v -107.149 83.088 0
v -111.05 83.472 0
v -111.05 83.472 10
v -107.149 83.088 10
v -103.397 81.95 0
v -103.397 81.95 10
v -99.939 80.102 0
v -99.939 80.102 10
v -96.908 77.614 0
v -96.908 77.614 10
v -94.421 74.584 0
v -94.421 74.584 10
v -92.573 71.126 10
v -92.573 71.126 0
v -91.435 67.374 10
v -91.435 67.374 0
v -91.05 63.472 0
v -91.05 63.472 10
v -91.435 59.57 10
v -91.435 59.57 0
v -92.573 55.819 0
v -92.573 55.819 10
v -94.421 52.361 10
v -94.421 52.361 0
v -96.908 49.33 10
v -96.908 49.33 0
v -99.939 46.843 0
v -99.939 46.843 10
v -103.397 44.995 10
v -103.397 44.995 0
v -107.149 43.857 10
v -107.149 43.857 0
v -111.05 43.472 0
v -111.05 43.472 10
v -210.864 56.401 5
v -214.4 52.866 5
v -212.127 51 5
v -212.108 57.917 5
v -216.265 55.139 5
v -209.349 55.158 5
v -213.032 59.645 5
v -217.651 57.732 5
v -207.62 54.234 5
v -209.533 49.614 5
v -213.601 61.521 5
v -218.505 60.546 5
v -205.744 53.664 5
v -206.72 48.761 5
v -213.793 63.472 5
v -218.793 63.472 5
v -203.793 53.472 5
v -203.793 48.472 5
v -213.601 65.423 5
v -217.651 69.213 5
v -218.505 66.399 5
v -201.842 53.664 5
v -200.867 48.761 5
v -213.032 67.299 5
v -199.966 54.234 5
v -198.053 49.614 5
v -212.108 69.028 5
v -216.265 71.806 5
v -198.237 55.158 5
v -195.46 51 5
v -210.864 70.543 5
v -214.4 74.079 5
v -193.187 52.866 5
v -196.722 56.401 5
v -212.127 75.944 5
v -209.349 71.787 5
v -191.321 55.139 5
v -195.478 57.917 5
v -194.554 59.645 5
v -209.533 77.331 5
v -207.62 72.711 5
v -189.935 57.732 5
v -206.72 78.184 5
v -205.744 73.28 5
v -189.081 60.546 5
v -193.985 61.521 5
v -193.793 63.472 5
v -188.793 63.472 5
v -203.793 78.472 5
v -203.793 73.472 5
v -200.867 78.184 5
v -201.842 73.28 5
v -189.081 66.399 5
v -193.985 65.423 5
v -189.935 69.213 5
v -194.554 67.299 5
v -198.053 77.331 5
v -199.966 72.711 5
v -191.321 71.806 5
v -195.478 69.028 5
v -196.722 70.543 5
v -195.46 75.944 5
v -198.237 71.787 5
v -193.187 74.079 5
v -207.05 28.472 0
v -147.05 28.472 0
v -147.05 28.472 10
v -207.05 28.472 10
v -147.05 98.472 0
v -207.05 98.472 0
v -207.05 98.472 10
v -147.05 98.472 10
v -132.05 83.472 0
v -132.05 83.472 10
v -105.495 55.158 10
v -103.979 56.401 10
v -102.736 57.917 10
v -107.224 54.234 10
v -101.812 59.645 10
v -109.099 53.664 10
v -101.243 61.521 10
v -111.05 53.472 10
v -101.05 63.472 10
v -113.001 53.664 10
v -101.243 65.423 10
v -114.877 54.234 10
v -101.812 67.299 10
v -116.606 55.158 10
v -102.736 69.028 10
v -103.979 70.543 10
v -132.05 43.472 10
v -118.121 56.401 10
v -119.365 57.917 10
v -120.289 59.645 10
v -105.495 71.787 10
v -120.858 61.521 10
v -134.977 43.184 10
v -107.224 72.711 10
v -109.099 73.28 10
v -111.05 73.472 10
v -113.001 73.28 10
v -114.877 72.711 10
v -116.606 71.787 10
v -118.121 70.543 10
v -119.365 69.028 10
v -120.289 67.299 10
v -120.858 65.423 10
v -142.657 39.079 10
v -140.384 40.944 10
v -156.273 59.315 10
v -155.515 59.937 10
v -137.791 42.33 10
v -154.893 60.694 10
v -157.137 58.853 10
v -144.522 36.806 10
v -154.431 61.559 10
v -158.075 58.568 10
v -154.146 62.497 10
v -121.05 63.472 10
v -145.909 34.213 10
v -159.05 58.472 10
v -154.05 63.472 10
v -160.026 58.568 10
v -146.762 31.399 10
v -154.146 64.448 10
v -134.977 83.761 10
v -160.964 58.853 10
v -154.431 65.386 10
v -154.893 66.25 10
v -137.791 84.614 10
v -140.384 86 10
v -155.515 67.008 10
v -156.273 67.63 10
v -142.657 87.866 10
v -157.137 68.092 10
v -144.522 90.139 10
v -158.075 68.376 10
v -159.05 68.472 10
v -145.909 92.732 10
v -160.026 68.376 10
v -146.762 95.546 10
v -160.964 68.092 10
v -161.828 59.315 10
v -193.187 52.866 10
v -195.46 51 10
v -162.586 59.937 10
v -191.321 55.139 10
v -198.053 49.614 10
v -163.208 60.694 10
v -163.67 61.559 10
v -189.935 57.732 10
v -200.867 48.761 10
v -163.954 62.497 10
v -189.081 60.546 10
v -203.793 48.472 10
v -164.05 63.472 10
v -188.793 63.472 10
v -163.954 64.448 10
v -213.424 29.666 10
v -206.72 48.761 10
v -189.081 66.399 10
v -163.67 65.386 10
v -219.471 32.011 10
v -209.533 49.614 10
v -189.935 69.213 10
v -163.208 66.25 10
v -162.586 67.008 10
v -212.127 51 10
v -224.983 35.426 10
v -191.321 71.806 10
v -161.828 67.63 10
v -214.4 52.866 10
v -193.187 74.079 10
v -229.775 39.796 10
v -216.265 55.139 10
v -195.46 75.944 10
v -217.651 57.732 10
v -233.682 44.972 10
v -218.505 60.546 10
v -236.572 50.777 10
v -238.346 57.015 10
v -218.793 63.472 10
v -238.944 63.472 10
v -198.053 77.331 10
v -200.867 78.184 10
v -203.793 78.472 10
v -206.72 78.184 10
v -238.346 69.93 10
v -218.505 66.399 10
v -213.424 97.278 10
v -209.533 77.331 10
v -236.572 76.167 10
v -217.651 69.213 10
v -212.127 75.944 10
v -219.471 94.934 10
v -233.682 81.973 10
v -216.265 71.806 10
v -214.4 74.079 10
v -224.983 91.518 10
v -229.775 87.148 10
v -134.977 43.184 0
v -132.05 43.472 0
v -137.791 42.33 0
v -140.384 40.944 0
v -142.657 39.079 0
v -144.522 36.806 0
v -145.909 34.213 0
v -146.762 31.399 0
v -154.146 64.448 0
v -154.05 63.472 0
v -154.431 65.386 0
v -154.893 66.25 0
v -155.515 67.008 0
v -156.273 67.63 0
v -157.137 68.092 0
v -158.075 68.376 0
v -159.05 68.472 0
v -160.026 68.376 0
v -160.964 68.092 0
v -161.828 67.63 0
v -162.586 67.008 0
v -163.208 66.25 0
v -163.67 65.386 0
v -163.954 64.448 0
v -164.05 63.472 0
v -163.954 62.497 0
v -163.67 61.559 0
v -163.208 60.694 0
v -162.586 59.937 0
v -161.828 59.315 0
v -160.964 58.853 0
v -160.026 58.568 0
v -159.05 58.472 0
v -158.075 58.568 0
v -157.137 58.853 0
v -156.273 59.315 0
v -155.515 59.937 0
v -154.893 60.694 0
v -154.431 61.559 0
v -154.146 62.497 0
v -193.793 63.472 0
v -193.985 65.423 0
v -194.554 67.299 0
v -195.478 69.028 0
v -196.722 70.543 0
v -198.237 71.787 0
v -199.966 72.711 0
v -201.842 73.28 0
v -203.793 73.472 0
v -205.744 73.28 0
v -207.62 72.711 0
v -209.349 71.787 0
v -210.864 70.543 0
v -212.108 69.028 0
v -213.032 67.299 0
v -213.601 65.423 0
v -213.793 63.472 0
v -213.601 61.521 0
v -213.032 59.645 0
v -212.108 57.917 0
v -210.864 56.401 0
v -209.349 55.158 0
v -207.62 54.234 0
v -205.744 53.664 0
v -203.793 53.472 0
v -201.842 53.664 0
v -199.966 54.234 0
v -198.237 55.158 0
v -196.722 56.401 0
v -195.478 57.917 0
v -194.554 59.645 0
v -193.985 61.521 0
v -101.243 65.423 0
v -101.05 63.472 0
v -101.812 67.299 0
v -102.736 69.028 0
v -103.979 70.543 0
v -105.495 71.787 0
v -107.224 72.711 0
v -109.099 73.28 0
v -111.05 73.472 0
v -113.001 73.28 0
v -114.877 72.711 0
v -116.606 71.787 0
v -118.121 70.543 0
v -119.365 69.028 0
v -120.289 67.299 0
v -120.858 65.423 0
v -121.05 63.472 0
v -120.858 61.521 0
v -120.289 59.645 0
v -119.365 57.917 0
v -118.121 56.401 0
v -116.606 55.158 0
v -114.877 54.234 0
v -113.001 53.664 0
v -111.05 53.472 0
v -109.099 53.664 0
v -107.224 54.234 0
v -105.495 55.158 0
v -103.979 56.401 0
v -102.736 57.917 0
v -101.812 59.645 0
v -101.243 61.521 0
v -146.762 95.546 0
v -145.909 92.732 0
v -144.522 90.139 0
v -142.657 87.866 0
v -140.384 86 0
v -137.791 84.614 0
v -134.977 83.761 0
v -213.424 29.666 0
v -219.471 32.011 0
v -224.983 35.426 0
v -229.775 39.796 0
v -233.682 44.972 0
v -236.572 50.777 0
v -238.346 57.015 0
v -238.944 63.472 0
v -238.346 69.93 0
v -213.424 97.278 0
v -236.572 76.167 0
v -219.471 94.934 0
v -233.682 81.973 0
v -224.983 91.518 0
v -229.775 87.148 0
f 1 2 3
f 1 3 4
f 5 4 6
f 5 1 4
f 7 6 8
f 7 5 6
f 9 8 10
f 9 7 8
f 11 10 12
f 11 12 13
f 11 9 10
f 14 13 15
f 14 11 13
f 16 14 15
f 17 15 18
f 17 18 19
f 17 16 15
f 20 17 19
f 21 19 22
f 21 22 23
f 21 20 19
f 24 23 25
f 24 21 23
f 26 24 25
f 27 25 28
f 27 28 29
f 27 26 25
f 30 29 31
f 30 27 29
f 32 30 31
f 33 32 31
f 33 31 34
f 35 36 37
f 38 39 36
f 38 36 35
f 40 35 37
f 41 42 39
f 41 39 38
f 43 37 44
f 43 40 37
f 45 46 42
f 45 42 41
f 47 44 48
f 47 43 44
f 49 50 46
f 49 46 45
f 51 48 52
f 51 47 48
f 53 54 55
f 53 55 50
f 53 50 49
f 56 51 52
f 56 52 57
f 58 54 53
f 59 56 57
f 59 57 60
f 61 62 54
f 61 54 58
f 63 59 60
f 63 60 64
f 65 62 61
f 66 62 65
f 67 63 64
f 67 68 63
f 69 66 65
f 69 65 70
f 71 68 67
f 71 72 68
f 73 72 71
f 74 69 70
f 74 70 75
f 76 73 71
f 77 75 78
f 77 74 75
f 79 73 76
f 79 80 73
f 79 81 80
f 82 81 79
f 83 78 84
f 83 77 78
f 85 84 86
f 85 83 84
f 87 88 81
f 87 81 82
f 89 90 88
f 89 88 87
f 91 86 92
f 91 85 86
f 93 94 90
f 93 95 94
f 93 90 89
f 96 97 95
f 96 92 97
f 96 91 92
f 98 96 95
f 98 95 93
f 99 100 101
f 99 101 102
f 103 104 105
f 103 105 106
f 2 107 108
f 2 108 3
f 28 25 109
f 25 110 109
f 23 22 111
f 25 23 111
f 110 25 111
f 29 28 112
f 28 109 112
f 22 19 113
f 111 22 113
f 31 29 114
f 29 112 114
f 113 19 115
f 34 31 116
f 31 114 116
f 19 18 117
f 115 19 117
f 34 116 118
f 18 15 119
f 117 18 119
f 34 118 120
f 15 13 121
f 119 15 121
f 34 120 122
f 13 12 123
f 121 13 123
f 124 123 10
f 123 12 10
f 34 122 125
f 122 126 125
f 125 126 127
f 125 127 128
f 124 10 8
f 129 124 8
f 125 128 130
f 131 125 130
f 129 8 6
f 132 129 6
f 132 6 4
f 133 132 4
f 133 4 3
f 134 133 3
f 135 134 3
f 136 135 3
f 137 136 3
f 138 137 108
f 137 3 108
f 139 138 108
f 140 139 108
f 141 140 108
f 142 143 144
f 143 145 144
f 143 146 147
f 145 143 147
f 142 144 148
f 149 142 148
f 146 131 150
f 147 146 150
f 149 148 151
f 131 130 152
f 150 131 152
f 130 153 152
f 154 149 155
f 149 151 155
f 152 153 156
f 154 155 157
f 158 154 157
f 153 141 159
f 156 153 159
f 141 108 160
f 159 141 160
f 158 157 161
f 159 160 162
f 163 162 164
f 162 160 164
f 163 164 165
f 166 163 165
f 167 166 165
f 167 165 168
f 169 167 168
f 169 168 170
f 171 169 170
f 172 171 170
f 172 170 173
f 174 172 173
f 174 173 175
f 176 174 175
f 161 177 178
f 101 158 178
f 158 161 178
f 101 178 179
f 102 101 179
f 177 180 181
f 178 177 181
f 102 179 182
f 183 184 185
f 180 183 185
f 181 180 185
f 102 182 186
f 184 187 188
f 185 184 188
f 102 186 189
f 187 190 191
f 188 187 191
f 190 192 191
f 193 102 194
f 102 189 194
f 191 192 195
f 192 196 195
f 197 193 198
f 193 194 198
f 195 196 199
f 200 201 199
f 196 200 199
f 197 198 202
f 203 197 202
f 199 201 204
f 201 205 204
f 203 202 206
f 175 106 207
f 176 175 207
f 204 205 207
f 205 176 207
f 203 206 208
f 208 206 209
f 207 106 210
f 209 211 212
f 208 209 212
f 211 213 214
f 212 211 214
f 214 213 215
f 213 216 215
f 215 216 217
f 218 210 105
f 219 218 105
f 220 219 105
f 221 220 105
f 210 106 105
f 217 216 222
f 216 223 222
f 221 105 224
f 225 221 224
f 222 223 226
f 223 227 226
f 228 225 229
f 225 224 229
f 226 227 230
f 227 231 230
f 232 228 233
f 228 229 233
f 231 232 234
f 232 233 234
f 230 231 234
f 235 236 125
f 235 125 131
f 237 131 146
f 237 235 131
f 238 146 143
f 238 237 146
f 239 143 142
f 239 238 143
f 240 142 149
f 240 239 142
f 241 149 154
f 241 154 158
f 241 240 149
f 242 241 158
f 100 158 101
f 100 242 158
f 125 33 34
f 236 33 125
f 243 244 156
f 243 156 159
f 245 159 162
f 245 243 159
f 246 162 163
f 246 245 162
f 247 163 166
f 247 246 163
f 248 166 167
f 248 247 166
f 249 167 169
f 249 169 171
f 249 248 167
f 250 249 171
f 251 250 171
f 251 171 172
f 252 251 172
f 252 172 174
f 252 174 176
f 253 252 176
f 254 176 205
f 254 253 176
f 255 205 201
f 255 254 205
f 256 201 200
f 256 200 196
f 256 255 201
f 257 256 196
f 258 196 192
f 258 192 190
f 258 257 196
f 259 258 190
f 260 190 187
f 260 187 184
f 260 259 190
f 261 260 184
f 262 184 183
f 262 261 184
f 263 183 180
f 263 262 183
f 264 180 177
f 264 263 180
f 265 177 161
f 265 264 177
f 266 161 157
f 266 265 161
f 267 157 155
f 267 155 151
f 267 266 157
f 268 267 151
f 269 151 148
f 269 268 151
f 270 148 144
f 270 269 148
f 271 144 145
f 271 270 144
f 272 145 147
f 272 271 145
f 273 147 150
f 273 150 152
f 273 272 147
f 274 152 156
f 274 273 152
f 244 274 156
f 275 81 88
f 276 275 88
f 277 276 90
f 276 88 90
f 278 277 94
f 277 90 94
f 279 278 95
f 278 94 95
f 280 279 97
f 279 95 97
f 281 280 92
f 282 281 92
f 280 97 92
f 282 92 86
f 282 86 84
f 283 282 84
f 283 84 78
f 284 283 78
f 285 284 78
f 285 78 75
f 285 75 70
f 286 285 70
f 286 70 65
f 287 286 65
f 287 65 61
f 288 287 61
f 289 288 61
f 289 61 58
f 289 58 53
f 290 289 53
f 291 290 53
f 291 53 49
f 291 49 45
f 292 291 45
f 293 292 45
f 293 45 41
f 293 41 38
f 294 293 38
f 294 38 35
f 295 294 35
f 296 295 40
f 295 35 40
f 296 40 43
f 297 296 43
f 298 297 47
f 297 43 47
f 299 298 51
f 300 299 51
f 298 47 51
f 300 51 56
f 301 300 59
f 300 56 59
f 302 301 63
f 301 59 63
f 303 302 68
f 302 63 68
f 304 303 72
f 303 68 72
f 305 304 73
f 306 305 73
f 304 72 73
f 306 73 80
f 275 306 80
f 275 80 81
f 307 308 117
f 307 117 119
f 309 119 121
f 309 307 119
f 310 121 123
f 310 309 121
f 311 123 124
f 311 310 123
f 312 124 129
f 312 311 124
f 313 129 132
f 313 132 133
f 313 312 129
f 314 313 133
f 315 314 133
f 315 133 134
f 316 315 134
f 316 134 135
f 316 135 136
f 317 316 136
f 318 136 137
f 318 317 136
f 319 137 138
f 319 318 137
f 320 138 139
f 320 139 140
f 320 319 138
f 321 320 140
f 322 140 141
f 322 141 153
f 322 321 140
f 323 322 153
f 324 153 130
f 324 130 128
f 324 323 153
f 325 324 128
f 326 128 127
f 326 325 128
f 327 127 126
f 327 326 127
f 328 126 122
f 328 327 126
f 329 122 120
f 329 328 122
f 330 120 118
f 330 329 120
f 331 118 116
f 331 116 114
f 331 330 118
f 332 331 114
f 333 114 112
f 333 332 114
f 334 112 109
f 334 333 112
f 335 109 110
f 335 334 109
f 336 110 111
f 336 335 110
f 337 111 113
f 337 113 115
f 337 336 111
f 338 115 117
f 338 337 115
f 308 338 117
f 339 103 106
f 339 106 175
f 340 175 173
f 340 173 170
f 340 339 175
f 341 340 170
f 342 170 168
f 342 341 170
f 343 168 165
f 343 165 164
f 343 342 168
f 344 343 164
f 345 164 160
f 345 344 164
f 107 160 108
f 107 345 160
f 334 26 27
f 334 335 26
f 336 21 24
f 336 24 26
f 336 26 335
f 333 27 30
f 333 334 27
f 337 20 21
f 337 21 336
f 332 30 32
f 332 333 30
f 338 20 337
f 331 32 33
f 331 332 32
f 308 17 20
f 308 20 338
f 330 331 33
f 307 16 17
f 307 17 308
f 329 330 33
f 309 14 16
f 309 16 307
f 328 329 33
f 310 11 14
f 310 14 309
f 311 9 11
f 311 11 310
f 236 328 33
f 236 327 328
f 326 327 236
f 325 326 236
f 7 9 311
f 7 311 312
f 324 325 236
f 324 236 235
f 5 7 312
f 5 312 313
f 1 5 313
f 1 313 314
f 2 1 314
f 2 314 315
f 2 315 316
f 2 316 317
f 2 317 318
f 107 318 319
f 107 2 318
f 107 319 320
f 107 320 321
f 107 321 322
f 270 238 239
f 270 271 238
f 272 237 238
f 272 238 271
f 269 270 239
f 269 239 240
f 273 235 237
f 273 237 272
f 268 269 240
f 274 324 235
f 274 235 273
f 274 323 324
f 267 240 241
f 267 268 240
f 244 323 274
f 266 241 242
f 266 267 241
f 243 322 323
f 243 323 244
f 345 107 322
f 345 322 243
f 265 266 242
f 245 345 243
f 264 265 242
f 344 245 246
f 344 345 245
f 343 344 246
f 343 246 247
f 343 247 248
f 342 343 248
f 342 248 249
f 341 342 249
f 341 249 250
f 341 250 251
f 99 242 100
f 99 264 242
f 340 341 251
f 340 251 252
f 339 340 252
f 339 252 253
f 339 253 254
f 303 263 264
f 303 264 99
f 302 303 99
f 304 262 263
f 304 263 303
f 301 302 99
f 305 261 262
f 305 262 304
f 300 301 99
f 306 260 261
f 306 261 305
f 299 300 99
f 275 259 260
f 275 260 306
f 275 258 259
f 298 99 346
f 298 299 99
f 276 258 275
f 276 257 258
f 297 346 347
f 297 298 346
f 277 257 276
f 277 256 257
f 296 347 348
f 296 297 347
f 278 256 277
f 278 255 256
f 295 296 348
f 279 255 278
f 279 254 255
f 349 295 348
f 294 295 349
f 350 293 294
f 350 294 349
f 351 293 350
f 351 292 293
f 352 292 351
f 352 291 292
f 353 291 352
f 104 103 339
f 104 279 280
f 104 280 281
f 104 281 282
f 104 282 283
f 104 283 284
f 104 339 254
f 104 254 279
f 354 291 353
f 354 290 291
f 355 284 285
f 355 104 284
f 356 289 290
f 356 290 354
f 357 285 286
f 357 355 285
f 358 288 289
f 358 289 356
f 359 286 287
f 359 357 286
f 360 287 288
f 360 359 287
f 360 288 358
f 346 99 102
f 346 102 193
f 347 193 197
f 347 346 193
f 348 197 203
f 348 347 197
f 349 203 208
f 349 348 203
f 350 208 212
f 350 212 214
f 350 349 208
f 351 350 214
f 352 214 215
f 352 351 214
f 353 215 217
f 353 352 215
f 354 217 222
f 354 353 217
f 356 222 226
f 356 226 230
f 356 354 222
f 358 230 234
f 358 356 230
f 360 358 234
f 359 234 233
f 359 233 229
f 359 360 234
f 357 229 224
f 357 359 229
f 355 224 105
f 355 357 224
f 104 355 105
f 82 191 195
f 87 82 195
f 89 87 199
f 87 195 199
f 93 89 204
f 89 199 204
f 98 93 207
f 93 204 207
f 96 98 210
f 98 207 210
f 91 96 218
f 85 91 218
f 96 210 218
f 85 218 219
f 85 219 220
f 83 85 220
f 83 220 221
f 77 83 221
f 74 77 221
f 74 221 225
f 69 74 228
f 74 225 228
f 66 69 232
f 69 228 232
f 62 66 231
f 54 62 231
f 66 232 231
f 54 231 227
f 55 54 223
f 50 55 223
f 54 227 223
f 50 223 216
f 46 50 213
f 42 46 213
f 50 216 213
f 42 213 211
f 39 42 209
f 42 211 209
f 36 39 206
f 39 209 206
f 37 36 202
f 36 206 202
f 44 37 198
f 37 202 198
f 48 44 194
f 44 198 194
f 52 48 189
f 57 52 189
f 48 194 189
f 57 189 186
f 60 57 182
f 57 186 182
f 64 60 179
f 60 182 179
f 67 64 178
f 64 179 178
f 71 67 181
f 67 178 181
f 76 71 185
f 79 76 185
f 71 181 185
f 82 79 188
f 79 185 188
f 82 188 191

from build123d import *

# Parameters (mm, degrees)
SKETCH2_R           = 10
SKETCH2_R_2         = 5
BOSS_EXTRUDE3_DEPTH = 10
SKETCH3_R           = 15
CUT_EXTRUDE1_DEPTH  = 5
SKETCH4_R           = 10
CUT_EXTRUDE2_DEPTH  = 259.488315973


with BuildPart() as part:
    # Sketch2 → Boss-Extrude3 (new body)
    with BuildSketch(Plane.XY):
        with BuildLine():
            Line((-207.050381934, 98.472297517), (-147.050381934, 98.472297517))
            ThreePointArc((-147.050381934, 98.472297517), (-142.656983652, 87.865695799), (-132.050381934, 83.472297517))
            Line((-132.050381934, 83.472297517), (-111.050381934, 83.472297517))
            ThreePointArc((-111.050381934, 83.472297517), (-91.050381934, 63.472297517), (-111.050381934, 43.472297517))
            Line((-111.050381934, 43.472297517), (-132.050406277, 43.472297517))
            ThreePointArc((-132.050406277, 43.472297517), (-142.656990782, 39.078906365), (-147.050381934, 28.47232186))
            Line((-147.050381934, 28.47232186), (-207.050381934, 28.47232186))
            ThreePointArc((-207.050381934, 28.47232186), (-238.944378708, 63.472309688), (-207.050381934, 98.472297517))
        make_face()
        with Locations((-111.050381934, 63.472297517)):
            Circle(SKETCH2_R, mode=Mode.SUBTRACT)
        with Locations((-159.050381934, 63.472309688)):
            Circle(SKETCH2_R_2, mode=Mode.SUBTRACT)
    extrude(amount=BOSS_EXTRUDE3_DEPTH)

    # Sketch3 → Cut-Extrude1 (cut)
    with BuildSketch(Plane.XY.offset(10)):
        with Locations((-203.793152693, 63.472309688)):
            Circle(SKETCH3_R)
    extrude(amount=-CUT_EXTRUDE1_DEPTH, mode=Mode.SUBTRACT)

    # Sketch4 → Cut-Extrude2 (cut, through all)
    with BuildSketch(Plane.XY.offset(5)):
        with Locations((-203.793152693, 63.472309688)):
            Circle(SKETCH4_R)
    extrude(amount=-CUT_EXTRUDE2_DEPTH, mode=Mode.SUBTRACT)


solid = part.part
